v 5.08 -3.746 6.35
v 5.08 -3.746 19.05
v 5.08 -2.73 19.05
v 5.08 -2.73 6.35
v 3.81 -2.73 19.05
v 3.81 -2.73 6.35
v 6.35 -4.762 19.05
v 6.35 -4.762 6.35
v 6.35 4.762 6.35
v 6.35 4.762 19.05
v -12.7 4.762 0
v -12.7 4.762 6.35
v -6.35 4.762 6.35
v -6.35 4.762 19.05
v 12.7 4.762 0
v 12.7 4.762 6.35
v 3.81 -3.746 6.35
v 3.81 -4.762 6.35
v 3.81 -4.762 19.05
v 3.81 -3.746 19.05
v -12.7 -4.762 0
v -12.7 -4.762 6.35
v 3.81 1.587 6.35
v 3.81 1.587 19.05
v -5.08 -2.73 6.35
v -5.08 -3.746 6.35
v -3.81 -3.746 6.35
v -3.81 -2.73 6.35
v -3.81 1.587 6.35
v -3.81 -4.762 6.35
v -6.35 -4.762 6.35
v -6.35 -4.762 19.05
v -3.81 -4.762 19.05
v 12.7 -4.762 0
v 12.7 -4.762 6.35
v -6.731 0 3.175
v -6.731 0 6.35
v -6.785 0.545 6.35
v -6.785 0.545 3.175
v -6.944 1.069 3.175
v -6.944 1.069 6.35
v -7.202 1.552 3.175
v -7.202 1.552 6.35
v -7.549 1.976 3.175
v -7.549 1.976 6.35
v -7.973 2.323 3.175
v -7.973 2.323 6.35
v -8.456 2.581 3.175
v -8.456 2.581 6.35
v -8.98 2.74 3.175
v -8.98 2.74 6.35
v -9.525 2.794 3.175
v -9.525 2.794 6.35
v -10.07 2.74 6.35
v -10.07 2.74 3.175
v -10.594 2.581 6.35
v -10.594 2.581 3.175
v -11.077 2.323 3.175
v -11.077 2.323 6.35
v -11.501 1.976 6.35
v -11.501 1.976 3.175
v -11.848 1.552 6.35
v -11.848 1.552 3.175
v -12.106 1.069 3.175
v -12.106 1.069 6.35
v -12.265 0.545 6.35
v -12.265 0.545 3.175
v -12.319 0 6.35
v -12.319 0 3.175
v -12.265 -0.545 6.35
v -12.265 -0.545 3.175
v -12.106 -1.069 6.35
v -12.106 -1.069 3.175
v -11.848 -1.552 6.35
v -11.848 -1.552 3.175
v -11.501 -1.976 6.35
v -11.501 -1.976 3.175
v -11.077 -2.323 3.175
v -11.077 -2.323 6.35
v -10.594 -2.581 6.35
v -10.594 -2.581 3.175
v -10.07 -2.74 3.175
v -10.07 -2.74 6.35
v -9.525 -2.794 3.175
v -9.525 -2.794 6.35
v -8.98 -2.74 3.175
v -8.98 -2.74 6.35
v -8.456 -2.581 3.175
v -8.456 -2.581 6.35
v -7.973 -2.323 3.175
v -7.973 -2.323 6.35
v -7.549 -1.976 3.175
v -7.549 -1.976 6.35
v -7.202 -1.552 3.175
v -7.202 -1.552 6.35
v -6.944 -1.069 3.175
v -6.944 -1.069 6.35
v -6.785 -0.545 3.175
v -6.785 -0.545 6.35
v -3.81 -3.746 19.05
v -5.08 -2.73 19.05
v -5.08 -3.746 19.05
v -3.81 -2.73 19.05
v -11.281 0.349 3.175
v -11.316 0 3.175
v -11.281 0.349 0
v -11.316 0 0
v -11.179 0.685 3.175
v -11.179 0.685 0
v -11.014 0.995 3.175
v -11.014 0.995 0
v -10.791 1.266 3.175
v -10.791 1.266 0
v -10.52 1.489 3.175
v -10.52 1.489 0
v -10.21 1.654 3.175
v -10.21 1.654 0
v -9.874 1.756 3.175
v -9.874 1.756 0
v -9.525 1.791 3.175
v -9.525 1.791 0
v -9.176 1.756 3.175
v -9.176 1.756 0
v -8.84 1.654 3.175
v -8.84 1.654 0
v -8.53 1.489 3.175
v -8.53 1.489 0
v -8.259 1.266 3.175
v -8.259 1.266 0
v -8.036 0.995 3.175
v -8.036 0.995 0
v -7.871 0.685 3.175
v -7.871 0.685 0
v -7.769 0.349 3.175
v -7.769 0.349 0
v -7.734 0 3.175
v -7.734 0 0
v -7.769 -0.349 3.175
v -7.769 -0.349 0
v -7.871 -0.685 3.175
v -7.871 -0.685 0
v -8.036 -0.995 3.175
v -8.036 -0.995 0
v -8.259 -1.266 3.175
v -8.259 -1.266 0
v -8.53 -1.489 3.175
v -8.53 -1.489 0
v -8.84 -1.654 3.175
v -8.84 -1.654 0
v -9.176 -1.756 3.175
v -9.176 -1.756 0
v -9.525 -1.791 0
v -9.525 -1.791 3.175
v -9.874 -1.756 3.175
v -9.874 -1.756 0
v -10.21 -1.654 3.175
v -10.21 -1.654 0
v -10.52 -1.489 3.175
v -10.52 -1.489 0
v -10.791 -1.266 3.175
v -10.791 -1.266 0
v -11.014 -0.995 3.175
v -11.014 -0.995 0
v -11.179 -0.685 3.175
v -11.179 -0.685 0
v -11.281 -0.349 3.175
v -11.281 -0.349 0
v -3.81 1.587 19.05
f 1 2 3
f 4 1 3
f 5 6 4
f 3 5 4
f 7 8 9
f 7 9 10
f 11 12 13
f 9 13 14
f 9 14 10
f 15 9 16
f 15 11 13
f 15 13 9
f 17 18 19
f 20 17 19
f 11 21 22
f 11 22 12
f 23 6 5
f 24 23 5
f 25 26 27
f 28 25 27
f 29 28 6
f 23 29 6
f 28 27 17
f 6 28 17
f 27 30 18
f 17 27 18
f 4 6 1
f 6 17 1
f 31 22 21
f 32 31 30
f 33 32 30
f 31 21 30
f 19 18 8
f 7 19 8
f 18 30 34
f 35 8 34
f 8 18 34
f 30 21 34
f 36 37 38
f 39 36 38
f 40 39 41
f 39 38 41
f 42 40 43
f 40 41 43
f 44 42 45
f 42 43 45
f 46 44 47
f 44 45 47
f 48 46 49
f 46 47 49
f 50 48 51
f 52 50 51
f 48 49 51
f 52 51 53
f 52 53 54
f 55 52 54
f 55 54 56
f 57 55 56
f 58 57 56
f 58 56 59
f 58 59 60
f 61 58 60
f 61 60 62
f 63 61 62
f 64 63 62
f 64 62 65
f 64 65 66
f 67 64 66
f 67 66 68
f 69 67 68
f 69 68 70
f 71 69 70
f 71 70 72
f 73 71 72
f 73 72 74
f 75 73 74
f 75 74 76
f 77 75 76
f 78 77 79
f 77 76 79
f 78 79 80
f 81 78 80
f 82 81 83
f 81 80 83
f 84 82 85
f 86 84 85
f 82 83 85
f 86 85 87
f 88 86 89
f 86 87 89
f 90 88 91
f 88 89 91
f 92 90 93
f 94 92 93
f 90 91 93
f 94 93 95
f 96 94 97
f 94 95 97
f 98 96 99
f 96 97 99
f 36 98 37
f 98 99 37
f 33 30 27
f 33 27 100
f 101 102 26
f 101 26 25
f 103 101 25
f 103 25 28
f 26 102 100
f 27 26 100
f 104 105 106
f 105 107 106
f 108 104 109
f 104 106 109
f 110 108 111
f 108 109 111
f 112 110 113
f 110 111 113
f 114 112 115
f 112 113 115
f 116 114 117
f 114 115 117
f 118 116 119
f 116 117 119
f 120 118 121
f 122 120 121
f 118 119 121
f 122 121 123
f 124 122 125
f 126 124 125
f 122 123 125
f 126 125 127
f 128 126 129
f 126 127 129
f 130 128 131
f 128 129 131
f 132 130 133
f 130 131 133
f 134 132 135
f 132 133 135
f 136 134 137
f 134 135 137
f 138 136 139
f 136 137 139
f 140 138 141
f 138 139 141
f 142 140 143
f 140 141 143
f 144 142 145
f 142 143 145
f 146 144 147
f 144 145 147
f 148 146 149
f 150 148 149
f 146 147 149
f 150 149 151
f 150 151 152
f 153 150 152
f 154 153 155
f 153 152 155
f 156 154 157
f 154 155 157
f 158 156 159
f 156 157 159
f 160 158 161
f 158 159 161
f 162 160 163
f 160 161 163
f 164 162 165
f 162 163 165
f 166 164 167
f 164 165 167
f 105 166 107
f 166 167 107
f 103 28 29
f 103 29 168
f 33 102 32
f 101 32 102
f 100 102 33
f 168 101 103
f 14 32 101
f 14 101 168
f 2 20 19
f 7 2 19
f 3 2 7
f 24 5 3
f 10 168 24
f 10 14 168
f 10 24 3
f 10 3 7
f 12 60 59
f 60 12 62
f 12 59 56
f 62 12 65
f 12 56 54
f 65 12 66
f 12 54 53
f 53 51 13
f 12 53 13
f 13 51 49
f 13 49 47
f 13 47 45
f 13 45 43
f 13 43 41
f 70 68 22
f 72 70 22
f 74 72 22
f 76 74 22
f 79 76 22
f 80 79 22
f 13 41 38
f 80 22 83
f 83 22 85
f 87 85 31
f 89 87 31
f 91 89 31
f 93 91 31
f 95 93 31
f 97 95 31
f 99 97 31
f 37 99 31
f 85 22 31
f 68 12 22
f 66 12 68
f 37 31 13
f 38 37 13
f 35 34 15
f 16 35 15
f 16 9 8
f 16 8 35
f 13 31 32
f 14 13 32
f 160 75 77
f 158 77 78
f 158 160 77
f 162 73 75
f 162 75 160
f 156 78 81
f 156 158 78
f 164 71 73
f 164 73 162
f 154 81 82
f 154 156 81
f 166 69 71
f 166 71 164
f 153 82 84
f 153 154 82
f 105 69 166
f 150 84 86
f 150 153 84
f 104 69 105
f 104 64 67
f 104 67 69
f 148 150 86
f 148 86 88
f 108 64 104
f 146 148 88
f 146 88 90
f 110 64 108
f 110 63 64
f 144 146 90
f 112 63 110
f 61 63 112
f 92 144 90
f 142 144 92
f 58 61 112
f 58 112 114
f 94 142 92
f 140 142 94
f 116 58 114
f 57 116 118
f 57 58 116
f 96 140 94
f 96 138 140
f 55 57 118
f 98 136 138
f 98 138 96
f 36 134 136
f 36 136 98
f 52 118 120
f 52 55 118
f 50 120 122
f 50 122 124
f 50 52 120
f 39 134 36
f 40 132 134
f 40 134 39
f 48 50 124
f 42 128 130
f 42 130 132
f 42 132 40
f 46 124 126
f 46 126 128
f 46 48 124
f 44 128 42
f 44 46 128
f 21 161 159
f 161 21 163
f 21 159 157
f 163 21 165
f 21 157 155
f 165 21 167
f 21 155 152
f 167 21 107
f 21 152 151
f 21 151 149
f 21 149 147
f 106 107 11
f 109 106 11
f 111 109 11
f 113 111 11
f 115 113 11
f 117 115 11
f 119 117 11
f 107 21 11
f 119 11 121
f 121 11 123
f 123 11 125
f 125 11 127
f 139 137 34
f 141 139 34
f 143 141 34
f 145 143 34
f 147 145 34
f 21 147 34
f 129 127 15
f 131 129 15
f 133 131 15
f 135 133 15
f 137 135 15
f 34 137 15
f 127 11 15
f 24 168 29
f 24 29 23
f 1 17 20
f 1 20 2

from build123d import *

# Parameters (mm, degrees)
F0_W           = 25.4
F0_H           = 9.525
F1_DEPTH       = 19.05
F2_W           = 6.35
F2_H           = 12.7
F3_DEPTH       = 25.4
F5_D           = 3.5814
F5_DEPTH       = 6.731
F5_CBORE_D     = 5.588
F5_CBORE_DEPTH = 3.175
F6_W           = 7.62
F6_H           = 12.7
F7_DEPTH       = 6.35
F8_W           = 10.16
F8_H           = 1.016
F9_DEPTH       = 12.7


with BuildPart() as f1:
    # F0 (on Top) → F1 (new body)
    with BuildSketch(Plane.XY):
        Rectangle(F0_W, F0_H)
    extrude(amount=F1_DEPTH)

    # F2 (on face) → F3 (cut)
    with BuildSketch(Plane.XZ.offset(4.7625)):
        with Locations((-9.525, 12.7)):
            Rectangle(F2_W, F2_H)
        with Locations((9.525, 12.7)):
            Rectangle(F2_W, F2_H)
    extrude(amount=-F3_DEPTH, mode=Mode.SUBTRACT)

    # F5
    with Locations(Plane.XY.offset(6.35)):
        with Locations((-9.525, 0)):
            CounterBoreHole(F5_D / 2, F5_CBORE_D / 2, F5_CBORE_DEPTH, depth=F5_DEPTH)

    # F6 (on face) → F7 (cut)
    with BuildSketch(Plane.XZ.offset(4.7625)):
        with Locations((0, 12.7)):
            Rectangle(F6_W, F6_H)
    extrude(amount=-F7_DEPTH, mode=Mode.SUBTRACT)

    # F8 (on face) → F9 (cut)
    with BuildSketch(Plane.XY.offset(19.05)):
        with Locations((0, -3.2385)):
            Rectangle(F8_W, F8_H)
    extrude(amount=-F9_DEPTH, mode=Mode.SUBTRACT)


solid = f1.part
